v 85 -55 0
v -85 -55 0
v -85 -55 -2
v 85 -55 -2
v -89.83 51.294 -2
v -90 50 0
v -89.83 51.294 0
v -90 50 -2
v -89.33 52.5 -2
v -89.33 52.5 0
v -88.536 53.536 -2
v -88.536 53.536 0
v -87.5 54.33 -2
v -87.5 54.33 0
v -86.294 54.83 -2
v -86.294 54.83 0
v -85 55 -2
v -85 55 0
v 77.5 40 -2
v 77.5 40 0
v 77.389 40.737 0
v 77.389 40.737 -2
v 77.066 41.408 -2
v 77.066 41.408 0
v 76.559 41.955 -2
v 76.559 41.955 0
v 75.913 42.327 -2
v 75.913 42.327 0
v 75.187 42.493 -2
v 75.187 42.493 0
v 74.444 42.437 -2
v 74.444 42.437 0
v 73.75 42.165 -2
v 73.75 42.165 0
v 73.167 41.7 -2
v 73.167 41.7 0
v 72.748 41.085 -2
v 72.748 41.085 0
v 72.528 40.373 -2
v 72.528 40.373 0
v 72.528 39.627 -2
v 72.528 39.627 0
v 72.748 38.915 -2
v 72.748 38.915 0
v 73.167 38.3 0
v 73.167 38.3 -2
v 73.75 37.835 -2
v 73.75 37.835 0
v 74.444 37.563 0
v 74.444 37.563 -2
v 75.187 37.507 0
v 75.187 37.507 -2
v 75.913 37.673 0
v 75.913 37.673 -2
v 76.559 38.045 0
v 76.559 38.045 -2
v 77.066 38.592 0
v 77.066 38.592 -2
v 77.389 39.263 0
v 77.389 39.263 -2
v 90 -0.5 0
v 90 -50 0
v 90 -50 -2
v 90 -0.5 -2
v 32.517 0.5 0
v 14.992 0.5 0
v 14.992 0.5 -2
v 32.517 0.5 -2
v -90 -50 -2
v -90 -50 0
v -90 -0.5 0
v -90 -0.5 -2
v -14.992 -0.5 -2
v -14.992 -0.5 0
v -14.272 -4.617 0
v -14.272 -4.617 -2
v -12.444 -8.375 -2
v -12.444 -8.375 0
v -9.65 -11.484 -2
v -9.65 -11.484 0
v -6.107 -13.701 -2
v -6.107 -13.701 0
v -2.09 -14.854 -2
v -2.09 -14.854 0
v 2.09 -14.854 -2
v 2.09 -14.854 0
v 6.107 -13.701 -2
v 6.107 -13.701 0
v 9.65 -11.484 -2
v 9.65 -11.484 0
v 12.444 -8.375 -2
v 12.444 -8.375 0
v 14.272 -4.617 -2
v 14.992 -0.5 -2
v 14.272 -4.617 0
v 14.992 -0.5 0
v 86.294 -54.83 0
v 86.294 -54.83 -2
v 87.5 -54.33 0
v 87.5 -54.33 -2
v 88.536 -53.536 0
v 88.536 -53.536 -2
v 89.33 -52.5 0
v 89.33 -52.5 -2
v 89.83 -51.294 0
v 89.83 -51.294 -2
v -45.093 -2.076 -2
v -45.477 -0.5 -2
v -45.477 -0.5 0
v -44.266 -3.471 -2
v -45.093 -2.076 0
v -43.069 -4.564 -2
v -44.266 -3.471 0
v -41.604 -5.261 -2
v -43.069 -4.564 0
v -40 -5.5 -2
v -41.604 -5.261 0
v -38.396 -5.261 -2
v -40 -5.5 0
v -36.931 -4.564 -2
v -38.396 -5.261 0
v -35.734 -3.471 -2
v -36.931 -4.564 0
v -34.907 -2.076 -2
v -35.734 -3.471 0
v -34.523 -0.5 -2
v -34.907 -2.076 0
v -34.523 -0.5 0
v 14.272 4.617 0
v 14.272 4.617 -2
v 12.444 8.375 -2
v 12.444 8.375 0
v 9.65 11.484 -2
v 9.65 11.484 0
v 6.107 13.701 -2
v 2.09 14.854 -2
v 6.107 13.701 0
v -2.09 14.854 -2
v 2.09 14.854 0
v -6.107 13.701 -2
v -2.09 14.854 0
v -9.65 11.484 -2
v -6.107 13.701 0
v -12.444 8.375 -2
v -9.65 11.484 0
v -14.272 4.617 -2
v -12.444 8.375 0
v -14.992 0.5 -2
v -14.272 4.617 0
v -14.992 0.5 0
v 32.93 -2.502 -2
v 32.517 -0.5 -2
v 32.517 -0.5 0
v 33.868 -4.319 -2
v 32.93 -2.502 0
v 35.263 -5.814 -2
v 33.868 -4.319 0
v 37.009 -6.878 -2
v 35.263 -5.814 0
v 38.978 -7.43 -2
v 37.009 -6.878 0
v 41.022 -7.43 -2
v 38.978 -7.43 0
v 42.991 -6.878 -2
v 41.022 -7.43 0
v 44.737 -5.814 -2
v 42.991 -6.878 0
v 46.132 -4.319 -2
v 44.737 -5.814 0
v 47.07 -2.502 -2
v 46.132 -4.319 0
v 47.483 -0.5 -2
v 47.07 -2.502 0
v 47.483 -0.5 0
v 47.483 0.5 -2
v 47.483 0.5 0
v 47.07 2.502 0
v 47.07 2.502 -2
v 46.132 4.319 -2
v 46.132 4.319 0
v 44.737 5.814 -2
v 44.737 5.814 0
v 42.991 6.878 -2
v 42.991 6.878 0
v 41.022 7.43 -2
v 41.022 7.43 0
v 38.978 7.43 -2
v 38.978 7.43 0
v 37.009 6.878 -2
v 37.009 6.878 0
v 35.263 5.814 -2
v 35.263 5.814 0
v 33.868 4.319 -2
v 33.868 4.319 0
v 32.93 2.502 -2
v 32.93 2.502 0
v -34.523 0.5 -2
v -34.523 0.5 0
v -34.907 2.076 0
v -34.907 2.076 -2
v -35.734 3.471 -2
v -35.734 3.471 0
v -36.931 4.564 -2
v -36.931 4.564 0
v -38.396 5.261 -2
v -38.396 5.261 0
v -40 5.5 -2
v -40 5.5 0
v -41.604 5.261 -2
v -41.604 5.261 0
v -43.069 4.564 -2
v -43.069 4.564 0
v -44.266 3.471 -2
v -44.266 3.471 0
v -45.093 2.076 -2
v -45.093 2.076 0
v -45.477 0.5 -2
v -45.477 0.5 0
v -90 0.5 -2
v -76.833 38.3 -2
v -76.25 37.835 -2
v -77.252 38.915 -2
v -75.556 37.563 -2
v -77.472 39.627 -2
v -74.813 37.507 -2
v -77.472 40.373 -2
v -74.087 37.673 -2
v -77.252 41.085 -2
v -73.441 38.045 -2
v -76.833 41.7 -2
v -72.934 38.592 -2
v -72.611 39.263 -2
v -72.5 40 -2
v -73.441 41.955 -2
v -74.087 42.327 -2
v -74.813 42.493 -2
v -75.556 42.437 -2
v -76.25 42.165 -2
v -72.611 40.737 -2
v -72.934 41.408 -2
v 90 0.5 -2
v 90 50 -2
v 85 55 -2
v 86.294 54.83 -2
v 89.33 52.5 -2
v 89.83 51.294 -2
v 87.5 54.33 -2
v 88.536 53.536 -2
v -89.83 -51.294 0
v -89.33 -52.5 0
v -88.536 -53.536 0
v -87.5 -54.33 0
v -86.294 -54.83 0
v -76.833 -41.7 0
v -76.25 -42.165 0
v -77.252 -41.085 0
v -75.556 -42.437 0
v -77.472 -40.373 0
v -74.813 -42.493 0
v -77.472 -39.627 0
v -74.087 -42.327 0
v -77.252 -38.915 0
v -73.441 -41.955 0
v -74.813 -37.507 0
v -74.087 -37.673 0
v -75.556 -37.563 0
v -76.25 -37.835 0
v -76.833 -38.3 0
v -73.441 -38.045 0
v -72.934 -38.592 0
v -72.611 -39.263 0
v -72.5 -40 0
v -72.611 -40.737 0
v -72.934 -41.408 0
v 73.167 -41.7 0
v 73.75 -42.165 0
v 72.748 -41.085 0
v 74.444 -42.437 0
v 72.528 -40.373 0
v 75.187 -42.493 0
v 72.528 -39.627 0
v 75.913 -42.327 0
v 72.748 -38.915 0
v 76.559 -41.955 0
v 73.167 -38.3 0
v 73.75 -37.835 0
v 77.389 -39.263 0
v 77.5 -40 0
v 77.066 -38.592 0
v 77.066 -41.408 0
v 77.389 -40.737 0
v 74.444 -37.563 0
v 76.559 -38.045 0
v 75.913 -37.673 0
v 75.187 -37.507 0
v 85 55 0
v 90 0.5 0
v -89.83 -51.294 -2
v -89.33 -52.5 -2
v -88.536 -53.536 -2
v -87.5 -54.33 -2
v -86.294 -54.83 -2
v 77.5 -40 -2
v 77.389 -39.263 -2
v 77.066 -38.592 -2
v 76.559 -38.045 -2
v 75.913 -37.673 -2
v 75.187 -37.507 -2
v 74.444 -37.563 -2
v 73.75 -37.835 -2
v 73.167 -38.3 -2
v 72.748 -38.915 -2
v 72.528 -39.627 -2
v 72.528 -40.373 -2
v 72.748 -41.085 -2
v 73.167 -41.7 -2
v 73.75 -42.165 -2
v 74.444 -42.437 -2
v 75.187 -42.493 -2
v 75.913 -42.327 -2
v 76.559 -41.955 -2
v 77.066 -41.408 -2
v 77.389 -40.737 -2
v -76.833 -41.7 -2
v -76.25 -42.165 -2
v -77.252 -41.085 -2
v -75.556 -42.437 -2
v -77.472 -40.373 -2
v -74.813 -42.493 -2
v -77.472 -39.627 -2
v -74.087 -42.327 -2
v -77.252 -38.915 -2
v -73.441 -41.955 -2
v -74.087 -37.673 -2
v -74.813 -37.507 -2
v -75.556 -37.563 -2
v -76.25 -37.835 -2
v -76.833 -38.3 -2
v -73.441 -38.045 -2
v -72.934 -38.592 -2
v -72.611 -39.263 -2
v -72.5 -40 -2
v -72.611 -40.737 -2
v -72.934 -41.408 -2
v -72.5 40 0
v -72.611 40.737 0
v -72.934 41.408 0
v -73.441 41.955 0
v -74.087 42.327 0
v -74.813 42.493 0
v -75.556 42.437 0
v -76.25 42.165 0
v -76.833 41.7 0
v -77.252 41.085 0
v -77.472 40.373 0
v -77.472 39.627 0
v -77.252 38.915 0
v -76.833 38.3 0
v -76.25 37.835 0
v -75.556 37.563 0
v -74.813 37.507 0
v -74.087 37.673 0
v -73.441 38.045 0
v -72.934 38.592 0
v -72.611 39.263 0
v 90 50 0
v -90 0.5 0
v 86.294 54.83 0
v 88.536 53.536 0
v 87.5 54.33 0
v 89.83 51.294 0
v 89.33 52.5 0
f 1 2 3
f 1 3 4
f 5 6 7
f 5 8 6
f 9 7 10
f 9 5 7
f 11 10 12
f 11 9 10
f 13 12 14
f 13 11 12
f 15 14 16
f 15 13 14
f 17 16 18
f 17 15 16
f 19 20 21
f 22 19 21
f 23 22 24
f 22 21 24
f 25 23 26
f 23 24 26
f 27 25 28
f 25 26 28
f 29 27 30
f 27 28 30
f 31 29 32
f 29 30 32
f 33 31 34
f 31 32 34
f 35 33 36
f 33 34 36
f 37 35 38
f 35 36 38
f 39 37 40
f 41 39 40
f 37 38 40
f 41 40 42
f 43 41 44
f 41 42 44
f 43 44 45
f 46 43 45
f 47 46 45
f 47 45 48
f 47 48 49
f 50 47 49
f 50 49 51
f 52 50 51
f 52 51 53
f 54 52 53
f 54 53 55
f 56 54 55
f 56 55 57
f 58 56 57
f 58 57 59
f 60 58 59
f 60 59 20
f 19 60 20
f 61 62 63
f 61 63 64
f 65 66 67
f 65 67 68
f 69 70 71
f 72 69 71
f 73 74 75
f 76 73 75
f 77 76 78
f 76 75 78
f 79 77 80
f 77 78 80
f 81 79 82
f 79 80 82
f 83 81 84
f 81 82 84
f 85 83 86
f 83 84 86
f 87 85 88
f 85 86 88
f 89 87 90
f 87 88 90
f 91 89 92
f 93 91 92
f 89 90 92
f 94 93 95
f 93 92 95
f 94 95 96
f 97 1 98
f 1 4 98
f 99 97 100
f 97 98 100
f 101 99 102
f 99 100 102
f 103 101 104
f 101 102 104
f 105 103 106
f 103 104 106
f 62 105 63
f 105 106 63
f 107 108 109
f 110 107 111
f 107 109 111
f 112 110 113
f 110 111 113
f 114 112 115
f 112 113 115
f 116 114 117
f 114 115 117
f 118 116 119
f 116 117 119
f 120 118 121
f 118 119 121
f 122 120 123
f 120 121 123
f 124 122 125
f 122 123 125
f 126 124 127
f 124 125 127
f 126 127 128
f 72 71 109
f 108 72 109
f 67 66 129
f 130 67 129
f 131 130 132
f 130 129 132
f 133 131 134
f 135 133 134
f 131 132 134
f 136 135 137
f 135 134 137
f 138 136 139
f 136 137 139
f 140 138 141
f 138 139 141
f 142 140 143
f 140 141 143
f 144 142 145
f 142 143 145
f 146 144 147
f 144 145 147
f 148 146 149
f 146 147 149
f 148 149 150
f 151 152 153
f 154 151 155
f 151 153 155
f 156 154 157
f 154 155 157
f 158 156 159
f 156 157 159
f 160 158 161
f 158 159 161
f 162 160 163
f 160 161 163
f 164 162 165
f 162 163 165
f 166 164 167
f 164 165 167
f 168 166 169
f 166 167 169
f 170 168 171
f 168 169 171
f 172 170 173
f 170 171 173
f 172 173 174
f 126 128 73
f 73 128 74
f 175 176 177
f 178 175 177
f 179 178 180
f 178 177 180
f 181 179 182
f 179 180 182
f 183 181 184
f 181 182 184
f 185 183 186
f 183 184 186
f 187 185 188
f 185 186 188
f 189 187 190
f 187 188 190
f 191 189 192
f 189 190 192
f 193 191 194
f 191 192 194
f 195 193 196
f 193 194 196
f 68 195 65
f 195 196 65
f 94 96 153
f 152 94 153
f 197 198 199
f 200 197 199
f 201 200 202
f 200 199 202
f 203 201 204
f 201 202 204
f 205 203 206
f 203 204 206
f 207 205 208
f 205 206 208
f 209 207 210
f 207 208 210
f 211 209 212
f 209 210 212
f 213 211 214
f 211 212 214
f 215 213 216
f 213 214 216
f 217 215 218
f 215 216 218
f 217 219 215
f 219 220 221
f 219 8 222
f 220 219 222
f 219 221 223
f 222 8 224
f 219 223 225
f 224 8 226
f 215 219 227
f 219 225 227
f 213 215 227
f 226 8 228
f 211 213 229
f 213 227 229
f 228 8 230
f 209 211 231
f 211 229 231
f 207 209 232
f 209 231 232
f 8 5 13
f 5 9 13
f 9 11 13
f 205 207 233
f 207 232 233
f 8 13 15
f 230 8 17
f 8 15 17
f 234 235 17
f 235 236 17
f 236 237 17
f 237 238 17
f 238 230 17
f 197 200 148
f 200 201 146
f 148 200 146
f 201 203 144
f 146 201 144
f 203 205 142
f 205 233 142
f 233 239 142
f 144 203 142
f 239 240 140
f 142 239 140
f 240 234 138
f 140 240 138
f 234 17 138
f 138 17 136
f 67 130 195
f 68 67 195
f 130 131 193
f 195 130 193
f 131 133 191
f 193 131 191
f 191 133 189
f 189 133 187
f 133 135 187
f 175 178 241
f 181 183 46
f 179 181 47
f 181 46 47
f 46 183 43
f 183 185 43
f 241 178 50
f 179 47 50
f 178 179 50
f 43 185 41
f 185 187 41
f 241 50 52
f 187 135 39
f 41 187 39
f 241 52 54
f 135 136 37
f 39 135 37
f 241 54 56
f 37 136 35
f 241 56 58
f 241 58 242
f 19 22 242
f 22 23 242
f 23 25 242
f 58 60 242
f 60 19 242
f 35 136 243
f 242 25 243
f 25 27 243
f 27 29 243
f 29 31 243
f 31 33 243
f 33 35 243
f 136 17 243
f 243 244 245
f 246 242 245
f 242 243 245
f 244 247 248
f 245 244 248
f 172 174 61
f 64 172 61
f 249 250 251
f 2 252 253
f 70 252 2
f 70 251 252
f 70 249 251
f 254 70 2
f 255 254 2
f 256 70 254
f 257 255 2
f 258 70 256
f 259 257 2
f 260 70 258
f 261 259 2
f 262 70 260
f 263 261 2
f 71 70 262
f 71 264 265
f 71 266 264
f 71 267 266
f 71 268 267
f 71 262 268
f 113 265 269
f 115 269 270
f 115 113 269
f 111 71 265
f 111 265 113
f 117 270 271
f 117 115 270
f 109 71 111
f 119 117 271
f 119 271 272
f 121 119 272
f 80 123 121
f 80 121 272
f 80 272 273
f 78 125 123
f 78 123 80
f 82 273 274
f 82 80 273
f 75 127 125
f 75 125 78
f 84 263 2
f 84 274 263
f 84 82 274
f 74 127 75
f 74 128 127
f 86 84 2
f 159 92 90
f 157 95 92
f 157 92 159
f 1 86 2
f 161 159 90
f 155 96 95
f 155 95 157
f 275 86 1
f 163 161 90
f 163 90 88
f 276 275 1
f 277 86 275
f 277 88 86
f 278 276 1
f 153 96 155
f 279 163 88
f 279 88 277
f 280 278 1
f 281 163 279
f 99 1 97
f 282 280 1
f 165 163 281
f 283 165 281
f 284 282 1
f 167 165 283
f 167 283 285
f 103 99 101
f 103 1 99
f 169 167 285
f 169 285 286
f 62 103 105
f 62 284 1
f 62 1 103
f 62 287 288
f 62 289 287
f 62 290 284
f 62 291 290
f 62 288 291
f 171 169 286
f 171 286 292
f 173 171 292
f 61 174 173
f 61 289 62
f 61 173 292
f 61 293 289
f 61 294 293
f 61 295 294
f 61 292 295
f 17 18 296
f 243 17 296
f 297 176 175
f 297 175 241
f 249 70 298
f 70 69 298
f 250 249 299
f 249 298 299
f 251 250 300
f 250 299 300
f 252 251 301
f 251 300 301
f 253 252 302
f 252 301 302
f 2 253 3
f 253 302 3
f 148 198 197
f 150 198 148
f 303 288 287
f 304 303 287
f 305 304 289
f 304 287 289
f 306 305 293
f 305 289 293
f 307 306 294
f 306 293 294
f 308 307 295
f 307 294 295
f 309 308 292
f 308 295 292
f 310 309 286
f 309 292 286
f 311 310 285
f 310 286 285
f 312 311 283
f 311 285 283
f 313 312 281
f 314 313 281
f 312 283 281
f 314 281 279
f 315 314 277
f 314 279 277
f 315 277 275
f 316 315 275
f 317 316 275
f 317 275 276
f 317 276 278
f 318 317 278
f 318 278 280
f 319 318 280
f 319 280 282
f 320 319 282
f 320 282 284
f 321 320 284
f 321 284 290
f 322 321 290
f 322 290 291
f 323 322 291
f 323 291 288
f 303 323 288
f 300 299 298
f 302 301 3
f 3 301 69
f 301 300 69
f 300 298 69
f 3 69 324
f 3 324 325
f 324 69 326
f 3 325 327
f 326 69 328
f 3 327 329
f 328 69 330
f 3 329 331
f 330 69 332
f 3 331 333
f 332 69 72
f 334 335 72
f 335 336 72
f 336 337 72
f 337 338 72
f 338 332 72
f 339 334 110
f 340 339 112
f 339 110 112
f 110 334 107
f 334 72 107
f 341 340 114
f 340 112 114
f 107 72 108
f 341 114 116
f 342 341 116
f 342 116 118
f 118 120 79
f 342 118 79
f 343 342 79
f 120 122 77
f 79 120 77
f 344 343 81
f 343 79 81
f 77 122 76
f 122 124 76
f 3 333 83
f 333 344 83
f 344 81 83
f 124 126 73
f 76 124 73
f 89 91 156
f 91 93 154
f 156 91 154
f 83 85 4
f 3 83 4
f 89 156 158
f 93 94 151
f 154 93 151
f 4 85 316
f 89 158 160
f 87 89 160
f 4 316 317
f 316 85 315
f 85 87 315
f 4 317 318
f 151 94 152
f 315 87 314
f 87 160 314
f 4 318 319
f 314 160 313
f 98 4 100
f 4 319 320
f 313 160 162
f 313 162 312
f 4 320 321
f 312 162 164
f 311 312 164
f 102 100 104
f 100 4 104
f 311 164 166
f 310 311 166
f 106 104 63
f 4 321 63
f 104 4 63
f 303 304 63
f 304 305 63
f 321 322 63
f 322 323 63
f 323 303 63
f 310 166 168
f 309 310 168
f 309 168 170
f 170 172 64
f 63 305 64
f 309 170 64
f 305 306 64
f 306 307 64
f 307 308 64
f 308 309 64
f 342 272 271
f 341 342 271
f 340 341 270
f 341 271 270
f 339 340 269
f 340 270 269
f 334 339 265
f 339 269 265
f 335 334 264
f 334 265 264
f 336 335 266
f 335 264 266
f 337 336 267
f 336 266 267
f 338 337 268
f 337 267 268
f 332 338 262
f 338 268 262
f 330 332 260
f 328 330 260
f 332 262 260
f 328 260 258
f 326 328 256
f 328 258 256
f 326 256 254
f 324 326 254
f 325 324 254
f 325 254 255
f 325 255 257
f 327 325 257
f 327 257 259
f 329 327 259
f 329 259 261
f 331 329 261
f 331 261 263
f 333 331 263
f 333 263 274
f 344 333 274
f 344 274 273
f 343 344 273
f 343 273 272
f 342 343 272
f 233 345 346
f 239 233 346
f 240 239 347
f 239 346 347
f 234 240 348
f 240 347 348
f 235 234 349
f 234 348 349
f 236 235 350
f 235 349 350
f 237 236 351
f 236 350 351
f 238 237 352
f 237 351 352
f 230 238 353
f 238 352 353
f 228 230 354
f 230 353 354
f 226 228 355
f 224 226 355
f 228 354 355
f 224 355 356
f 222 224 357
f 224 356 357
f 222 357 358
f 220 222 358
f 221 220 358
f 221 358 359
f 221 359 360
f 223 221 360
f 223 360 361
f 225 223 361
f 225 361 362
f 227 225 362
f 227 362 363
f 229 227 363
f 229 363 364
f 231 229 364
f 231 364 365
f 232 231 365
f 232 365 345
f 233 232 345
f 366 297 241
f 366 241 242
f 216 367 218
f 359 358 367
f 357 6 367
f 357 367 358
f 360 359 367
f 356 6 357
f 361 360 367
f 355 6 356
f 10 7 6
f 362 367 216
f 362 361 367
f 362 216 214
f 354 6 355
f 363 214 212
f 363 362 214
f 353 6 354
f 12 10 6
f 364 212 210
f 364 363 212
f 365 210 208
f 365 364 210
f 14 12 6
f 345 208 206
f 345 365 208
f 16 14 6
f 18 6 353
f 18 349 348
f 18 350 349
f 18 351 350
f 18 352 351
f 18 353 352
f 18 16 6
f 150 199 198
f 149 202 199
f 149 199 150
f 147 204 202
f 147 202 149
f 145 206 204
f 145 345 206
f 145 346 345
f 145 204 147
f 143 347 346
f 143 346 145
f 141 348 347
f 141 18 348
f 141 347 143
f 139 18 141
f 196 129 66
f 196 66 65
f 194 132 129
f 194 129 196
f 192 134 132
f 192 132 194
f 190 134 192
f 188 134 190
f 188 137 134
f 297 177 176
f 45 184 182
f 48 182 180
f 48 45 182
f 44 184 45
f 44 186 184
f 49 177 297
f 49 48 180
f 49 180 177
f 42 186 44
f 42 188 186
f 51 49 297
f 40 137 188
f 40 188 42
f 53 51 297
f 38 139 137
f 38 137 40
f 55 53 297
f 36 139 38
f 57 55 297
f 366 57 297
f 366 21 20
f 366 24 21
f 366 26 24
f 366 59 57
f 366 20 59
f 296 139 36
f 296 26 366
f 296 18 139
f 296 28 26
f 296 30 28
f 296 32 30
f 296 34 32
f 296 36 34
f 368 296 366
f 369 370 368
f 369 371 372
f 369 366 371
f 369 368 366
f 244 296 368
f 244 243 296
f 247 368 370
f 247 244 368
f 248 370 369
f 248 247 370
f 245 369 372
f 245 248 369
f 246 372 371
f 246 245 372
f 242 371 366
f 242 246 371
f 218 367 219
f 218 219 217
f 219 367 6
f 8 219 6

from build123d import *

# Parameters (mm, degrees)
SKETCH_1_W             = 180
SKETCH_1_H             = 110
SM_BASE_FLANGE_1_DEPTH = 2
SKETCH_6_R             = 15
SKETCH_6_R_2           = 5.5
SKETCH_6_R_3           = 7.5
CUT_EXTRUDE_1_DEPTH    = 10
FILLET_1_R             = 5
SKETCH_7_W             = 224.479555932
SKETCH_7_H             = 1
CUT_EXTRUDE_2_DEPTH    = 10
SKETCH_8_R             = 2.5
CUT_EXTRUDE_3_DEPTH    = 10


# Sheet-metal steps are written as plain solids
with BuildPart() as part:
    # Sketch 1 → 基体-法兰1 (new body)
    with BuildSketch(Plane.XY):
        Rectangle(SKETCH_1_W, SKETCH_1_H)
    extrude(amount=-SM_BASE_FLANGE_1_DEPTH)

    # 草图6 → 切除-拉伸1 (cut)
    with BuildSketch(Plane.XY):
        Circle(SKETCH_6_R)
        with Locations((-40, 0)):
            Circle(SKETCH_6_R_2)
        with Locations((40, 0)):
            Circle(SKETCH_6_R_3)
    extrude(amount=-CUT_EXTRUDE_1_DEPTH, mode=Mode.SUBTRACT)

    # 圆角1
    fillet_1_edges = [part.edges().sort_by_distance(p)[0] for p in [
        (-90, 55, -1),
        (90, 55, -1),
        (90, -55, -1),
        (-90, -55, -1),
    ]]
    fillet(fillet_1_edges, radius=FILLET_1_R)

    # 草图7 → 切除-拉伸2 (cut)
    with BuildSketch(Plane.XY):
        Rectangle(SKETCH_7_W, SKETCH_7_H)
    extrude(amount=-CUT_EXTRUDE_2_DEPTH, mode=Mode.SUBTRACT)


with BuildPart() as cut_extrude_2_piece_1:
    # of the separate pieces the step leaves, piece 1, a body of its own (cut_extrude_2_pieces)
    add(part.part.solids().sort_by_distance((85, -55, 0))[0])


with BuildPart() as cut_extrude_2_piece_2:
    # of the separate pieces the step leaves, piece 2, a body of its own (cut_extrude_2_pieces)
    add(part.part.solids().sort_by_distance((90, 50, 0))[0])


with BuildPart() as cut_extrude_3_tool:
    # 草图8 → 切除-拉伸3 (new body)
    with BuildSketch(Plane.XY):
        with Locations((75, 40)):
            Circle(SKETCH_8_R)
        with Locations((-75, 40)):
            Circle(SKETCH_8_R)
        with Locations((-75, -40)):
            Circle(SKETCH_8_R)
        with Locations((75, -40)):
            Circle(SKETCH_8_R)
    extrude(amount=-CUT_EXTRUDE_3_DEPTH)


with BuildPart() as cut_extrude_2_piece_1_1:
    add(cut_extrude_2_piece_1.part)

    # 切除-拉伸3: cut by cut_extrude_3_tool
    add(cut_extrude_3_tool.part, mode=Mode.SUBTRACT)


with BuildPart() as cut_extrude_2_piece_2_1:
    add(cut_extrude_2_piece_2.part)

    # 切除-拉伸3: cut by cut_extrude_3_tool
    add(cut_extrude_3_tool.part, mode=Mode.SUBTRACT)


solid = Compound([cut_extrude_2_piece_1_1.part, cut_extrude_2_piece_2_1.part])
